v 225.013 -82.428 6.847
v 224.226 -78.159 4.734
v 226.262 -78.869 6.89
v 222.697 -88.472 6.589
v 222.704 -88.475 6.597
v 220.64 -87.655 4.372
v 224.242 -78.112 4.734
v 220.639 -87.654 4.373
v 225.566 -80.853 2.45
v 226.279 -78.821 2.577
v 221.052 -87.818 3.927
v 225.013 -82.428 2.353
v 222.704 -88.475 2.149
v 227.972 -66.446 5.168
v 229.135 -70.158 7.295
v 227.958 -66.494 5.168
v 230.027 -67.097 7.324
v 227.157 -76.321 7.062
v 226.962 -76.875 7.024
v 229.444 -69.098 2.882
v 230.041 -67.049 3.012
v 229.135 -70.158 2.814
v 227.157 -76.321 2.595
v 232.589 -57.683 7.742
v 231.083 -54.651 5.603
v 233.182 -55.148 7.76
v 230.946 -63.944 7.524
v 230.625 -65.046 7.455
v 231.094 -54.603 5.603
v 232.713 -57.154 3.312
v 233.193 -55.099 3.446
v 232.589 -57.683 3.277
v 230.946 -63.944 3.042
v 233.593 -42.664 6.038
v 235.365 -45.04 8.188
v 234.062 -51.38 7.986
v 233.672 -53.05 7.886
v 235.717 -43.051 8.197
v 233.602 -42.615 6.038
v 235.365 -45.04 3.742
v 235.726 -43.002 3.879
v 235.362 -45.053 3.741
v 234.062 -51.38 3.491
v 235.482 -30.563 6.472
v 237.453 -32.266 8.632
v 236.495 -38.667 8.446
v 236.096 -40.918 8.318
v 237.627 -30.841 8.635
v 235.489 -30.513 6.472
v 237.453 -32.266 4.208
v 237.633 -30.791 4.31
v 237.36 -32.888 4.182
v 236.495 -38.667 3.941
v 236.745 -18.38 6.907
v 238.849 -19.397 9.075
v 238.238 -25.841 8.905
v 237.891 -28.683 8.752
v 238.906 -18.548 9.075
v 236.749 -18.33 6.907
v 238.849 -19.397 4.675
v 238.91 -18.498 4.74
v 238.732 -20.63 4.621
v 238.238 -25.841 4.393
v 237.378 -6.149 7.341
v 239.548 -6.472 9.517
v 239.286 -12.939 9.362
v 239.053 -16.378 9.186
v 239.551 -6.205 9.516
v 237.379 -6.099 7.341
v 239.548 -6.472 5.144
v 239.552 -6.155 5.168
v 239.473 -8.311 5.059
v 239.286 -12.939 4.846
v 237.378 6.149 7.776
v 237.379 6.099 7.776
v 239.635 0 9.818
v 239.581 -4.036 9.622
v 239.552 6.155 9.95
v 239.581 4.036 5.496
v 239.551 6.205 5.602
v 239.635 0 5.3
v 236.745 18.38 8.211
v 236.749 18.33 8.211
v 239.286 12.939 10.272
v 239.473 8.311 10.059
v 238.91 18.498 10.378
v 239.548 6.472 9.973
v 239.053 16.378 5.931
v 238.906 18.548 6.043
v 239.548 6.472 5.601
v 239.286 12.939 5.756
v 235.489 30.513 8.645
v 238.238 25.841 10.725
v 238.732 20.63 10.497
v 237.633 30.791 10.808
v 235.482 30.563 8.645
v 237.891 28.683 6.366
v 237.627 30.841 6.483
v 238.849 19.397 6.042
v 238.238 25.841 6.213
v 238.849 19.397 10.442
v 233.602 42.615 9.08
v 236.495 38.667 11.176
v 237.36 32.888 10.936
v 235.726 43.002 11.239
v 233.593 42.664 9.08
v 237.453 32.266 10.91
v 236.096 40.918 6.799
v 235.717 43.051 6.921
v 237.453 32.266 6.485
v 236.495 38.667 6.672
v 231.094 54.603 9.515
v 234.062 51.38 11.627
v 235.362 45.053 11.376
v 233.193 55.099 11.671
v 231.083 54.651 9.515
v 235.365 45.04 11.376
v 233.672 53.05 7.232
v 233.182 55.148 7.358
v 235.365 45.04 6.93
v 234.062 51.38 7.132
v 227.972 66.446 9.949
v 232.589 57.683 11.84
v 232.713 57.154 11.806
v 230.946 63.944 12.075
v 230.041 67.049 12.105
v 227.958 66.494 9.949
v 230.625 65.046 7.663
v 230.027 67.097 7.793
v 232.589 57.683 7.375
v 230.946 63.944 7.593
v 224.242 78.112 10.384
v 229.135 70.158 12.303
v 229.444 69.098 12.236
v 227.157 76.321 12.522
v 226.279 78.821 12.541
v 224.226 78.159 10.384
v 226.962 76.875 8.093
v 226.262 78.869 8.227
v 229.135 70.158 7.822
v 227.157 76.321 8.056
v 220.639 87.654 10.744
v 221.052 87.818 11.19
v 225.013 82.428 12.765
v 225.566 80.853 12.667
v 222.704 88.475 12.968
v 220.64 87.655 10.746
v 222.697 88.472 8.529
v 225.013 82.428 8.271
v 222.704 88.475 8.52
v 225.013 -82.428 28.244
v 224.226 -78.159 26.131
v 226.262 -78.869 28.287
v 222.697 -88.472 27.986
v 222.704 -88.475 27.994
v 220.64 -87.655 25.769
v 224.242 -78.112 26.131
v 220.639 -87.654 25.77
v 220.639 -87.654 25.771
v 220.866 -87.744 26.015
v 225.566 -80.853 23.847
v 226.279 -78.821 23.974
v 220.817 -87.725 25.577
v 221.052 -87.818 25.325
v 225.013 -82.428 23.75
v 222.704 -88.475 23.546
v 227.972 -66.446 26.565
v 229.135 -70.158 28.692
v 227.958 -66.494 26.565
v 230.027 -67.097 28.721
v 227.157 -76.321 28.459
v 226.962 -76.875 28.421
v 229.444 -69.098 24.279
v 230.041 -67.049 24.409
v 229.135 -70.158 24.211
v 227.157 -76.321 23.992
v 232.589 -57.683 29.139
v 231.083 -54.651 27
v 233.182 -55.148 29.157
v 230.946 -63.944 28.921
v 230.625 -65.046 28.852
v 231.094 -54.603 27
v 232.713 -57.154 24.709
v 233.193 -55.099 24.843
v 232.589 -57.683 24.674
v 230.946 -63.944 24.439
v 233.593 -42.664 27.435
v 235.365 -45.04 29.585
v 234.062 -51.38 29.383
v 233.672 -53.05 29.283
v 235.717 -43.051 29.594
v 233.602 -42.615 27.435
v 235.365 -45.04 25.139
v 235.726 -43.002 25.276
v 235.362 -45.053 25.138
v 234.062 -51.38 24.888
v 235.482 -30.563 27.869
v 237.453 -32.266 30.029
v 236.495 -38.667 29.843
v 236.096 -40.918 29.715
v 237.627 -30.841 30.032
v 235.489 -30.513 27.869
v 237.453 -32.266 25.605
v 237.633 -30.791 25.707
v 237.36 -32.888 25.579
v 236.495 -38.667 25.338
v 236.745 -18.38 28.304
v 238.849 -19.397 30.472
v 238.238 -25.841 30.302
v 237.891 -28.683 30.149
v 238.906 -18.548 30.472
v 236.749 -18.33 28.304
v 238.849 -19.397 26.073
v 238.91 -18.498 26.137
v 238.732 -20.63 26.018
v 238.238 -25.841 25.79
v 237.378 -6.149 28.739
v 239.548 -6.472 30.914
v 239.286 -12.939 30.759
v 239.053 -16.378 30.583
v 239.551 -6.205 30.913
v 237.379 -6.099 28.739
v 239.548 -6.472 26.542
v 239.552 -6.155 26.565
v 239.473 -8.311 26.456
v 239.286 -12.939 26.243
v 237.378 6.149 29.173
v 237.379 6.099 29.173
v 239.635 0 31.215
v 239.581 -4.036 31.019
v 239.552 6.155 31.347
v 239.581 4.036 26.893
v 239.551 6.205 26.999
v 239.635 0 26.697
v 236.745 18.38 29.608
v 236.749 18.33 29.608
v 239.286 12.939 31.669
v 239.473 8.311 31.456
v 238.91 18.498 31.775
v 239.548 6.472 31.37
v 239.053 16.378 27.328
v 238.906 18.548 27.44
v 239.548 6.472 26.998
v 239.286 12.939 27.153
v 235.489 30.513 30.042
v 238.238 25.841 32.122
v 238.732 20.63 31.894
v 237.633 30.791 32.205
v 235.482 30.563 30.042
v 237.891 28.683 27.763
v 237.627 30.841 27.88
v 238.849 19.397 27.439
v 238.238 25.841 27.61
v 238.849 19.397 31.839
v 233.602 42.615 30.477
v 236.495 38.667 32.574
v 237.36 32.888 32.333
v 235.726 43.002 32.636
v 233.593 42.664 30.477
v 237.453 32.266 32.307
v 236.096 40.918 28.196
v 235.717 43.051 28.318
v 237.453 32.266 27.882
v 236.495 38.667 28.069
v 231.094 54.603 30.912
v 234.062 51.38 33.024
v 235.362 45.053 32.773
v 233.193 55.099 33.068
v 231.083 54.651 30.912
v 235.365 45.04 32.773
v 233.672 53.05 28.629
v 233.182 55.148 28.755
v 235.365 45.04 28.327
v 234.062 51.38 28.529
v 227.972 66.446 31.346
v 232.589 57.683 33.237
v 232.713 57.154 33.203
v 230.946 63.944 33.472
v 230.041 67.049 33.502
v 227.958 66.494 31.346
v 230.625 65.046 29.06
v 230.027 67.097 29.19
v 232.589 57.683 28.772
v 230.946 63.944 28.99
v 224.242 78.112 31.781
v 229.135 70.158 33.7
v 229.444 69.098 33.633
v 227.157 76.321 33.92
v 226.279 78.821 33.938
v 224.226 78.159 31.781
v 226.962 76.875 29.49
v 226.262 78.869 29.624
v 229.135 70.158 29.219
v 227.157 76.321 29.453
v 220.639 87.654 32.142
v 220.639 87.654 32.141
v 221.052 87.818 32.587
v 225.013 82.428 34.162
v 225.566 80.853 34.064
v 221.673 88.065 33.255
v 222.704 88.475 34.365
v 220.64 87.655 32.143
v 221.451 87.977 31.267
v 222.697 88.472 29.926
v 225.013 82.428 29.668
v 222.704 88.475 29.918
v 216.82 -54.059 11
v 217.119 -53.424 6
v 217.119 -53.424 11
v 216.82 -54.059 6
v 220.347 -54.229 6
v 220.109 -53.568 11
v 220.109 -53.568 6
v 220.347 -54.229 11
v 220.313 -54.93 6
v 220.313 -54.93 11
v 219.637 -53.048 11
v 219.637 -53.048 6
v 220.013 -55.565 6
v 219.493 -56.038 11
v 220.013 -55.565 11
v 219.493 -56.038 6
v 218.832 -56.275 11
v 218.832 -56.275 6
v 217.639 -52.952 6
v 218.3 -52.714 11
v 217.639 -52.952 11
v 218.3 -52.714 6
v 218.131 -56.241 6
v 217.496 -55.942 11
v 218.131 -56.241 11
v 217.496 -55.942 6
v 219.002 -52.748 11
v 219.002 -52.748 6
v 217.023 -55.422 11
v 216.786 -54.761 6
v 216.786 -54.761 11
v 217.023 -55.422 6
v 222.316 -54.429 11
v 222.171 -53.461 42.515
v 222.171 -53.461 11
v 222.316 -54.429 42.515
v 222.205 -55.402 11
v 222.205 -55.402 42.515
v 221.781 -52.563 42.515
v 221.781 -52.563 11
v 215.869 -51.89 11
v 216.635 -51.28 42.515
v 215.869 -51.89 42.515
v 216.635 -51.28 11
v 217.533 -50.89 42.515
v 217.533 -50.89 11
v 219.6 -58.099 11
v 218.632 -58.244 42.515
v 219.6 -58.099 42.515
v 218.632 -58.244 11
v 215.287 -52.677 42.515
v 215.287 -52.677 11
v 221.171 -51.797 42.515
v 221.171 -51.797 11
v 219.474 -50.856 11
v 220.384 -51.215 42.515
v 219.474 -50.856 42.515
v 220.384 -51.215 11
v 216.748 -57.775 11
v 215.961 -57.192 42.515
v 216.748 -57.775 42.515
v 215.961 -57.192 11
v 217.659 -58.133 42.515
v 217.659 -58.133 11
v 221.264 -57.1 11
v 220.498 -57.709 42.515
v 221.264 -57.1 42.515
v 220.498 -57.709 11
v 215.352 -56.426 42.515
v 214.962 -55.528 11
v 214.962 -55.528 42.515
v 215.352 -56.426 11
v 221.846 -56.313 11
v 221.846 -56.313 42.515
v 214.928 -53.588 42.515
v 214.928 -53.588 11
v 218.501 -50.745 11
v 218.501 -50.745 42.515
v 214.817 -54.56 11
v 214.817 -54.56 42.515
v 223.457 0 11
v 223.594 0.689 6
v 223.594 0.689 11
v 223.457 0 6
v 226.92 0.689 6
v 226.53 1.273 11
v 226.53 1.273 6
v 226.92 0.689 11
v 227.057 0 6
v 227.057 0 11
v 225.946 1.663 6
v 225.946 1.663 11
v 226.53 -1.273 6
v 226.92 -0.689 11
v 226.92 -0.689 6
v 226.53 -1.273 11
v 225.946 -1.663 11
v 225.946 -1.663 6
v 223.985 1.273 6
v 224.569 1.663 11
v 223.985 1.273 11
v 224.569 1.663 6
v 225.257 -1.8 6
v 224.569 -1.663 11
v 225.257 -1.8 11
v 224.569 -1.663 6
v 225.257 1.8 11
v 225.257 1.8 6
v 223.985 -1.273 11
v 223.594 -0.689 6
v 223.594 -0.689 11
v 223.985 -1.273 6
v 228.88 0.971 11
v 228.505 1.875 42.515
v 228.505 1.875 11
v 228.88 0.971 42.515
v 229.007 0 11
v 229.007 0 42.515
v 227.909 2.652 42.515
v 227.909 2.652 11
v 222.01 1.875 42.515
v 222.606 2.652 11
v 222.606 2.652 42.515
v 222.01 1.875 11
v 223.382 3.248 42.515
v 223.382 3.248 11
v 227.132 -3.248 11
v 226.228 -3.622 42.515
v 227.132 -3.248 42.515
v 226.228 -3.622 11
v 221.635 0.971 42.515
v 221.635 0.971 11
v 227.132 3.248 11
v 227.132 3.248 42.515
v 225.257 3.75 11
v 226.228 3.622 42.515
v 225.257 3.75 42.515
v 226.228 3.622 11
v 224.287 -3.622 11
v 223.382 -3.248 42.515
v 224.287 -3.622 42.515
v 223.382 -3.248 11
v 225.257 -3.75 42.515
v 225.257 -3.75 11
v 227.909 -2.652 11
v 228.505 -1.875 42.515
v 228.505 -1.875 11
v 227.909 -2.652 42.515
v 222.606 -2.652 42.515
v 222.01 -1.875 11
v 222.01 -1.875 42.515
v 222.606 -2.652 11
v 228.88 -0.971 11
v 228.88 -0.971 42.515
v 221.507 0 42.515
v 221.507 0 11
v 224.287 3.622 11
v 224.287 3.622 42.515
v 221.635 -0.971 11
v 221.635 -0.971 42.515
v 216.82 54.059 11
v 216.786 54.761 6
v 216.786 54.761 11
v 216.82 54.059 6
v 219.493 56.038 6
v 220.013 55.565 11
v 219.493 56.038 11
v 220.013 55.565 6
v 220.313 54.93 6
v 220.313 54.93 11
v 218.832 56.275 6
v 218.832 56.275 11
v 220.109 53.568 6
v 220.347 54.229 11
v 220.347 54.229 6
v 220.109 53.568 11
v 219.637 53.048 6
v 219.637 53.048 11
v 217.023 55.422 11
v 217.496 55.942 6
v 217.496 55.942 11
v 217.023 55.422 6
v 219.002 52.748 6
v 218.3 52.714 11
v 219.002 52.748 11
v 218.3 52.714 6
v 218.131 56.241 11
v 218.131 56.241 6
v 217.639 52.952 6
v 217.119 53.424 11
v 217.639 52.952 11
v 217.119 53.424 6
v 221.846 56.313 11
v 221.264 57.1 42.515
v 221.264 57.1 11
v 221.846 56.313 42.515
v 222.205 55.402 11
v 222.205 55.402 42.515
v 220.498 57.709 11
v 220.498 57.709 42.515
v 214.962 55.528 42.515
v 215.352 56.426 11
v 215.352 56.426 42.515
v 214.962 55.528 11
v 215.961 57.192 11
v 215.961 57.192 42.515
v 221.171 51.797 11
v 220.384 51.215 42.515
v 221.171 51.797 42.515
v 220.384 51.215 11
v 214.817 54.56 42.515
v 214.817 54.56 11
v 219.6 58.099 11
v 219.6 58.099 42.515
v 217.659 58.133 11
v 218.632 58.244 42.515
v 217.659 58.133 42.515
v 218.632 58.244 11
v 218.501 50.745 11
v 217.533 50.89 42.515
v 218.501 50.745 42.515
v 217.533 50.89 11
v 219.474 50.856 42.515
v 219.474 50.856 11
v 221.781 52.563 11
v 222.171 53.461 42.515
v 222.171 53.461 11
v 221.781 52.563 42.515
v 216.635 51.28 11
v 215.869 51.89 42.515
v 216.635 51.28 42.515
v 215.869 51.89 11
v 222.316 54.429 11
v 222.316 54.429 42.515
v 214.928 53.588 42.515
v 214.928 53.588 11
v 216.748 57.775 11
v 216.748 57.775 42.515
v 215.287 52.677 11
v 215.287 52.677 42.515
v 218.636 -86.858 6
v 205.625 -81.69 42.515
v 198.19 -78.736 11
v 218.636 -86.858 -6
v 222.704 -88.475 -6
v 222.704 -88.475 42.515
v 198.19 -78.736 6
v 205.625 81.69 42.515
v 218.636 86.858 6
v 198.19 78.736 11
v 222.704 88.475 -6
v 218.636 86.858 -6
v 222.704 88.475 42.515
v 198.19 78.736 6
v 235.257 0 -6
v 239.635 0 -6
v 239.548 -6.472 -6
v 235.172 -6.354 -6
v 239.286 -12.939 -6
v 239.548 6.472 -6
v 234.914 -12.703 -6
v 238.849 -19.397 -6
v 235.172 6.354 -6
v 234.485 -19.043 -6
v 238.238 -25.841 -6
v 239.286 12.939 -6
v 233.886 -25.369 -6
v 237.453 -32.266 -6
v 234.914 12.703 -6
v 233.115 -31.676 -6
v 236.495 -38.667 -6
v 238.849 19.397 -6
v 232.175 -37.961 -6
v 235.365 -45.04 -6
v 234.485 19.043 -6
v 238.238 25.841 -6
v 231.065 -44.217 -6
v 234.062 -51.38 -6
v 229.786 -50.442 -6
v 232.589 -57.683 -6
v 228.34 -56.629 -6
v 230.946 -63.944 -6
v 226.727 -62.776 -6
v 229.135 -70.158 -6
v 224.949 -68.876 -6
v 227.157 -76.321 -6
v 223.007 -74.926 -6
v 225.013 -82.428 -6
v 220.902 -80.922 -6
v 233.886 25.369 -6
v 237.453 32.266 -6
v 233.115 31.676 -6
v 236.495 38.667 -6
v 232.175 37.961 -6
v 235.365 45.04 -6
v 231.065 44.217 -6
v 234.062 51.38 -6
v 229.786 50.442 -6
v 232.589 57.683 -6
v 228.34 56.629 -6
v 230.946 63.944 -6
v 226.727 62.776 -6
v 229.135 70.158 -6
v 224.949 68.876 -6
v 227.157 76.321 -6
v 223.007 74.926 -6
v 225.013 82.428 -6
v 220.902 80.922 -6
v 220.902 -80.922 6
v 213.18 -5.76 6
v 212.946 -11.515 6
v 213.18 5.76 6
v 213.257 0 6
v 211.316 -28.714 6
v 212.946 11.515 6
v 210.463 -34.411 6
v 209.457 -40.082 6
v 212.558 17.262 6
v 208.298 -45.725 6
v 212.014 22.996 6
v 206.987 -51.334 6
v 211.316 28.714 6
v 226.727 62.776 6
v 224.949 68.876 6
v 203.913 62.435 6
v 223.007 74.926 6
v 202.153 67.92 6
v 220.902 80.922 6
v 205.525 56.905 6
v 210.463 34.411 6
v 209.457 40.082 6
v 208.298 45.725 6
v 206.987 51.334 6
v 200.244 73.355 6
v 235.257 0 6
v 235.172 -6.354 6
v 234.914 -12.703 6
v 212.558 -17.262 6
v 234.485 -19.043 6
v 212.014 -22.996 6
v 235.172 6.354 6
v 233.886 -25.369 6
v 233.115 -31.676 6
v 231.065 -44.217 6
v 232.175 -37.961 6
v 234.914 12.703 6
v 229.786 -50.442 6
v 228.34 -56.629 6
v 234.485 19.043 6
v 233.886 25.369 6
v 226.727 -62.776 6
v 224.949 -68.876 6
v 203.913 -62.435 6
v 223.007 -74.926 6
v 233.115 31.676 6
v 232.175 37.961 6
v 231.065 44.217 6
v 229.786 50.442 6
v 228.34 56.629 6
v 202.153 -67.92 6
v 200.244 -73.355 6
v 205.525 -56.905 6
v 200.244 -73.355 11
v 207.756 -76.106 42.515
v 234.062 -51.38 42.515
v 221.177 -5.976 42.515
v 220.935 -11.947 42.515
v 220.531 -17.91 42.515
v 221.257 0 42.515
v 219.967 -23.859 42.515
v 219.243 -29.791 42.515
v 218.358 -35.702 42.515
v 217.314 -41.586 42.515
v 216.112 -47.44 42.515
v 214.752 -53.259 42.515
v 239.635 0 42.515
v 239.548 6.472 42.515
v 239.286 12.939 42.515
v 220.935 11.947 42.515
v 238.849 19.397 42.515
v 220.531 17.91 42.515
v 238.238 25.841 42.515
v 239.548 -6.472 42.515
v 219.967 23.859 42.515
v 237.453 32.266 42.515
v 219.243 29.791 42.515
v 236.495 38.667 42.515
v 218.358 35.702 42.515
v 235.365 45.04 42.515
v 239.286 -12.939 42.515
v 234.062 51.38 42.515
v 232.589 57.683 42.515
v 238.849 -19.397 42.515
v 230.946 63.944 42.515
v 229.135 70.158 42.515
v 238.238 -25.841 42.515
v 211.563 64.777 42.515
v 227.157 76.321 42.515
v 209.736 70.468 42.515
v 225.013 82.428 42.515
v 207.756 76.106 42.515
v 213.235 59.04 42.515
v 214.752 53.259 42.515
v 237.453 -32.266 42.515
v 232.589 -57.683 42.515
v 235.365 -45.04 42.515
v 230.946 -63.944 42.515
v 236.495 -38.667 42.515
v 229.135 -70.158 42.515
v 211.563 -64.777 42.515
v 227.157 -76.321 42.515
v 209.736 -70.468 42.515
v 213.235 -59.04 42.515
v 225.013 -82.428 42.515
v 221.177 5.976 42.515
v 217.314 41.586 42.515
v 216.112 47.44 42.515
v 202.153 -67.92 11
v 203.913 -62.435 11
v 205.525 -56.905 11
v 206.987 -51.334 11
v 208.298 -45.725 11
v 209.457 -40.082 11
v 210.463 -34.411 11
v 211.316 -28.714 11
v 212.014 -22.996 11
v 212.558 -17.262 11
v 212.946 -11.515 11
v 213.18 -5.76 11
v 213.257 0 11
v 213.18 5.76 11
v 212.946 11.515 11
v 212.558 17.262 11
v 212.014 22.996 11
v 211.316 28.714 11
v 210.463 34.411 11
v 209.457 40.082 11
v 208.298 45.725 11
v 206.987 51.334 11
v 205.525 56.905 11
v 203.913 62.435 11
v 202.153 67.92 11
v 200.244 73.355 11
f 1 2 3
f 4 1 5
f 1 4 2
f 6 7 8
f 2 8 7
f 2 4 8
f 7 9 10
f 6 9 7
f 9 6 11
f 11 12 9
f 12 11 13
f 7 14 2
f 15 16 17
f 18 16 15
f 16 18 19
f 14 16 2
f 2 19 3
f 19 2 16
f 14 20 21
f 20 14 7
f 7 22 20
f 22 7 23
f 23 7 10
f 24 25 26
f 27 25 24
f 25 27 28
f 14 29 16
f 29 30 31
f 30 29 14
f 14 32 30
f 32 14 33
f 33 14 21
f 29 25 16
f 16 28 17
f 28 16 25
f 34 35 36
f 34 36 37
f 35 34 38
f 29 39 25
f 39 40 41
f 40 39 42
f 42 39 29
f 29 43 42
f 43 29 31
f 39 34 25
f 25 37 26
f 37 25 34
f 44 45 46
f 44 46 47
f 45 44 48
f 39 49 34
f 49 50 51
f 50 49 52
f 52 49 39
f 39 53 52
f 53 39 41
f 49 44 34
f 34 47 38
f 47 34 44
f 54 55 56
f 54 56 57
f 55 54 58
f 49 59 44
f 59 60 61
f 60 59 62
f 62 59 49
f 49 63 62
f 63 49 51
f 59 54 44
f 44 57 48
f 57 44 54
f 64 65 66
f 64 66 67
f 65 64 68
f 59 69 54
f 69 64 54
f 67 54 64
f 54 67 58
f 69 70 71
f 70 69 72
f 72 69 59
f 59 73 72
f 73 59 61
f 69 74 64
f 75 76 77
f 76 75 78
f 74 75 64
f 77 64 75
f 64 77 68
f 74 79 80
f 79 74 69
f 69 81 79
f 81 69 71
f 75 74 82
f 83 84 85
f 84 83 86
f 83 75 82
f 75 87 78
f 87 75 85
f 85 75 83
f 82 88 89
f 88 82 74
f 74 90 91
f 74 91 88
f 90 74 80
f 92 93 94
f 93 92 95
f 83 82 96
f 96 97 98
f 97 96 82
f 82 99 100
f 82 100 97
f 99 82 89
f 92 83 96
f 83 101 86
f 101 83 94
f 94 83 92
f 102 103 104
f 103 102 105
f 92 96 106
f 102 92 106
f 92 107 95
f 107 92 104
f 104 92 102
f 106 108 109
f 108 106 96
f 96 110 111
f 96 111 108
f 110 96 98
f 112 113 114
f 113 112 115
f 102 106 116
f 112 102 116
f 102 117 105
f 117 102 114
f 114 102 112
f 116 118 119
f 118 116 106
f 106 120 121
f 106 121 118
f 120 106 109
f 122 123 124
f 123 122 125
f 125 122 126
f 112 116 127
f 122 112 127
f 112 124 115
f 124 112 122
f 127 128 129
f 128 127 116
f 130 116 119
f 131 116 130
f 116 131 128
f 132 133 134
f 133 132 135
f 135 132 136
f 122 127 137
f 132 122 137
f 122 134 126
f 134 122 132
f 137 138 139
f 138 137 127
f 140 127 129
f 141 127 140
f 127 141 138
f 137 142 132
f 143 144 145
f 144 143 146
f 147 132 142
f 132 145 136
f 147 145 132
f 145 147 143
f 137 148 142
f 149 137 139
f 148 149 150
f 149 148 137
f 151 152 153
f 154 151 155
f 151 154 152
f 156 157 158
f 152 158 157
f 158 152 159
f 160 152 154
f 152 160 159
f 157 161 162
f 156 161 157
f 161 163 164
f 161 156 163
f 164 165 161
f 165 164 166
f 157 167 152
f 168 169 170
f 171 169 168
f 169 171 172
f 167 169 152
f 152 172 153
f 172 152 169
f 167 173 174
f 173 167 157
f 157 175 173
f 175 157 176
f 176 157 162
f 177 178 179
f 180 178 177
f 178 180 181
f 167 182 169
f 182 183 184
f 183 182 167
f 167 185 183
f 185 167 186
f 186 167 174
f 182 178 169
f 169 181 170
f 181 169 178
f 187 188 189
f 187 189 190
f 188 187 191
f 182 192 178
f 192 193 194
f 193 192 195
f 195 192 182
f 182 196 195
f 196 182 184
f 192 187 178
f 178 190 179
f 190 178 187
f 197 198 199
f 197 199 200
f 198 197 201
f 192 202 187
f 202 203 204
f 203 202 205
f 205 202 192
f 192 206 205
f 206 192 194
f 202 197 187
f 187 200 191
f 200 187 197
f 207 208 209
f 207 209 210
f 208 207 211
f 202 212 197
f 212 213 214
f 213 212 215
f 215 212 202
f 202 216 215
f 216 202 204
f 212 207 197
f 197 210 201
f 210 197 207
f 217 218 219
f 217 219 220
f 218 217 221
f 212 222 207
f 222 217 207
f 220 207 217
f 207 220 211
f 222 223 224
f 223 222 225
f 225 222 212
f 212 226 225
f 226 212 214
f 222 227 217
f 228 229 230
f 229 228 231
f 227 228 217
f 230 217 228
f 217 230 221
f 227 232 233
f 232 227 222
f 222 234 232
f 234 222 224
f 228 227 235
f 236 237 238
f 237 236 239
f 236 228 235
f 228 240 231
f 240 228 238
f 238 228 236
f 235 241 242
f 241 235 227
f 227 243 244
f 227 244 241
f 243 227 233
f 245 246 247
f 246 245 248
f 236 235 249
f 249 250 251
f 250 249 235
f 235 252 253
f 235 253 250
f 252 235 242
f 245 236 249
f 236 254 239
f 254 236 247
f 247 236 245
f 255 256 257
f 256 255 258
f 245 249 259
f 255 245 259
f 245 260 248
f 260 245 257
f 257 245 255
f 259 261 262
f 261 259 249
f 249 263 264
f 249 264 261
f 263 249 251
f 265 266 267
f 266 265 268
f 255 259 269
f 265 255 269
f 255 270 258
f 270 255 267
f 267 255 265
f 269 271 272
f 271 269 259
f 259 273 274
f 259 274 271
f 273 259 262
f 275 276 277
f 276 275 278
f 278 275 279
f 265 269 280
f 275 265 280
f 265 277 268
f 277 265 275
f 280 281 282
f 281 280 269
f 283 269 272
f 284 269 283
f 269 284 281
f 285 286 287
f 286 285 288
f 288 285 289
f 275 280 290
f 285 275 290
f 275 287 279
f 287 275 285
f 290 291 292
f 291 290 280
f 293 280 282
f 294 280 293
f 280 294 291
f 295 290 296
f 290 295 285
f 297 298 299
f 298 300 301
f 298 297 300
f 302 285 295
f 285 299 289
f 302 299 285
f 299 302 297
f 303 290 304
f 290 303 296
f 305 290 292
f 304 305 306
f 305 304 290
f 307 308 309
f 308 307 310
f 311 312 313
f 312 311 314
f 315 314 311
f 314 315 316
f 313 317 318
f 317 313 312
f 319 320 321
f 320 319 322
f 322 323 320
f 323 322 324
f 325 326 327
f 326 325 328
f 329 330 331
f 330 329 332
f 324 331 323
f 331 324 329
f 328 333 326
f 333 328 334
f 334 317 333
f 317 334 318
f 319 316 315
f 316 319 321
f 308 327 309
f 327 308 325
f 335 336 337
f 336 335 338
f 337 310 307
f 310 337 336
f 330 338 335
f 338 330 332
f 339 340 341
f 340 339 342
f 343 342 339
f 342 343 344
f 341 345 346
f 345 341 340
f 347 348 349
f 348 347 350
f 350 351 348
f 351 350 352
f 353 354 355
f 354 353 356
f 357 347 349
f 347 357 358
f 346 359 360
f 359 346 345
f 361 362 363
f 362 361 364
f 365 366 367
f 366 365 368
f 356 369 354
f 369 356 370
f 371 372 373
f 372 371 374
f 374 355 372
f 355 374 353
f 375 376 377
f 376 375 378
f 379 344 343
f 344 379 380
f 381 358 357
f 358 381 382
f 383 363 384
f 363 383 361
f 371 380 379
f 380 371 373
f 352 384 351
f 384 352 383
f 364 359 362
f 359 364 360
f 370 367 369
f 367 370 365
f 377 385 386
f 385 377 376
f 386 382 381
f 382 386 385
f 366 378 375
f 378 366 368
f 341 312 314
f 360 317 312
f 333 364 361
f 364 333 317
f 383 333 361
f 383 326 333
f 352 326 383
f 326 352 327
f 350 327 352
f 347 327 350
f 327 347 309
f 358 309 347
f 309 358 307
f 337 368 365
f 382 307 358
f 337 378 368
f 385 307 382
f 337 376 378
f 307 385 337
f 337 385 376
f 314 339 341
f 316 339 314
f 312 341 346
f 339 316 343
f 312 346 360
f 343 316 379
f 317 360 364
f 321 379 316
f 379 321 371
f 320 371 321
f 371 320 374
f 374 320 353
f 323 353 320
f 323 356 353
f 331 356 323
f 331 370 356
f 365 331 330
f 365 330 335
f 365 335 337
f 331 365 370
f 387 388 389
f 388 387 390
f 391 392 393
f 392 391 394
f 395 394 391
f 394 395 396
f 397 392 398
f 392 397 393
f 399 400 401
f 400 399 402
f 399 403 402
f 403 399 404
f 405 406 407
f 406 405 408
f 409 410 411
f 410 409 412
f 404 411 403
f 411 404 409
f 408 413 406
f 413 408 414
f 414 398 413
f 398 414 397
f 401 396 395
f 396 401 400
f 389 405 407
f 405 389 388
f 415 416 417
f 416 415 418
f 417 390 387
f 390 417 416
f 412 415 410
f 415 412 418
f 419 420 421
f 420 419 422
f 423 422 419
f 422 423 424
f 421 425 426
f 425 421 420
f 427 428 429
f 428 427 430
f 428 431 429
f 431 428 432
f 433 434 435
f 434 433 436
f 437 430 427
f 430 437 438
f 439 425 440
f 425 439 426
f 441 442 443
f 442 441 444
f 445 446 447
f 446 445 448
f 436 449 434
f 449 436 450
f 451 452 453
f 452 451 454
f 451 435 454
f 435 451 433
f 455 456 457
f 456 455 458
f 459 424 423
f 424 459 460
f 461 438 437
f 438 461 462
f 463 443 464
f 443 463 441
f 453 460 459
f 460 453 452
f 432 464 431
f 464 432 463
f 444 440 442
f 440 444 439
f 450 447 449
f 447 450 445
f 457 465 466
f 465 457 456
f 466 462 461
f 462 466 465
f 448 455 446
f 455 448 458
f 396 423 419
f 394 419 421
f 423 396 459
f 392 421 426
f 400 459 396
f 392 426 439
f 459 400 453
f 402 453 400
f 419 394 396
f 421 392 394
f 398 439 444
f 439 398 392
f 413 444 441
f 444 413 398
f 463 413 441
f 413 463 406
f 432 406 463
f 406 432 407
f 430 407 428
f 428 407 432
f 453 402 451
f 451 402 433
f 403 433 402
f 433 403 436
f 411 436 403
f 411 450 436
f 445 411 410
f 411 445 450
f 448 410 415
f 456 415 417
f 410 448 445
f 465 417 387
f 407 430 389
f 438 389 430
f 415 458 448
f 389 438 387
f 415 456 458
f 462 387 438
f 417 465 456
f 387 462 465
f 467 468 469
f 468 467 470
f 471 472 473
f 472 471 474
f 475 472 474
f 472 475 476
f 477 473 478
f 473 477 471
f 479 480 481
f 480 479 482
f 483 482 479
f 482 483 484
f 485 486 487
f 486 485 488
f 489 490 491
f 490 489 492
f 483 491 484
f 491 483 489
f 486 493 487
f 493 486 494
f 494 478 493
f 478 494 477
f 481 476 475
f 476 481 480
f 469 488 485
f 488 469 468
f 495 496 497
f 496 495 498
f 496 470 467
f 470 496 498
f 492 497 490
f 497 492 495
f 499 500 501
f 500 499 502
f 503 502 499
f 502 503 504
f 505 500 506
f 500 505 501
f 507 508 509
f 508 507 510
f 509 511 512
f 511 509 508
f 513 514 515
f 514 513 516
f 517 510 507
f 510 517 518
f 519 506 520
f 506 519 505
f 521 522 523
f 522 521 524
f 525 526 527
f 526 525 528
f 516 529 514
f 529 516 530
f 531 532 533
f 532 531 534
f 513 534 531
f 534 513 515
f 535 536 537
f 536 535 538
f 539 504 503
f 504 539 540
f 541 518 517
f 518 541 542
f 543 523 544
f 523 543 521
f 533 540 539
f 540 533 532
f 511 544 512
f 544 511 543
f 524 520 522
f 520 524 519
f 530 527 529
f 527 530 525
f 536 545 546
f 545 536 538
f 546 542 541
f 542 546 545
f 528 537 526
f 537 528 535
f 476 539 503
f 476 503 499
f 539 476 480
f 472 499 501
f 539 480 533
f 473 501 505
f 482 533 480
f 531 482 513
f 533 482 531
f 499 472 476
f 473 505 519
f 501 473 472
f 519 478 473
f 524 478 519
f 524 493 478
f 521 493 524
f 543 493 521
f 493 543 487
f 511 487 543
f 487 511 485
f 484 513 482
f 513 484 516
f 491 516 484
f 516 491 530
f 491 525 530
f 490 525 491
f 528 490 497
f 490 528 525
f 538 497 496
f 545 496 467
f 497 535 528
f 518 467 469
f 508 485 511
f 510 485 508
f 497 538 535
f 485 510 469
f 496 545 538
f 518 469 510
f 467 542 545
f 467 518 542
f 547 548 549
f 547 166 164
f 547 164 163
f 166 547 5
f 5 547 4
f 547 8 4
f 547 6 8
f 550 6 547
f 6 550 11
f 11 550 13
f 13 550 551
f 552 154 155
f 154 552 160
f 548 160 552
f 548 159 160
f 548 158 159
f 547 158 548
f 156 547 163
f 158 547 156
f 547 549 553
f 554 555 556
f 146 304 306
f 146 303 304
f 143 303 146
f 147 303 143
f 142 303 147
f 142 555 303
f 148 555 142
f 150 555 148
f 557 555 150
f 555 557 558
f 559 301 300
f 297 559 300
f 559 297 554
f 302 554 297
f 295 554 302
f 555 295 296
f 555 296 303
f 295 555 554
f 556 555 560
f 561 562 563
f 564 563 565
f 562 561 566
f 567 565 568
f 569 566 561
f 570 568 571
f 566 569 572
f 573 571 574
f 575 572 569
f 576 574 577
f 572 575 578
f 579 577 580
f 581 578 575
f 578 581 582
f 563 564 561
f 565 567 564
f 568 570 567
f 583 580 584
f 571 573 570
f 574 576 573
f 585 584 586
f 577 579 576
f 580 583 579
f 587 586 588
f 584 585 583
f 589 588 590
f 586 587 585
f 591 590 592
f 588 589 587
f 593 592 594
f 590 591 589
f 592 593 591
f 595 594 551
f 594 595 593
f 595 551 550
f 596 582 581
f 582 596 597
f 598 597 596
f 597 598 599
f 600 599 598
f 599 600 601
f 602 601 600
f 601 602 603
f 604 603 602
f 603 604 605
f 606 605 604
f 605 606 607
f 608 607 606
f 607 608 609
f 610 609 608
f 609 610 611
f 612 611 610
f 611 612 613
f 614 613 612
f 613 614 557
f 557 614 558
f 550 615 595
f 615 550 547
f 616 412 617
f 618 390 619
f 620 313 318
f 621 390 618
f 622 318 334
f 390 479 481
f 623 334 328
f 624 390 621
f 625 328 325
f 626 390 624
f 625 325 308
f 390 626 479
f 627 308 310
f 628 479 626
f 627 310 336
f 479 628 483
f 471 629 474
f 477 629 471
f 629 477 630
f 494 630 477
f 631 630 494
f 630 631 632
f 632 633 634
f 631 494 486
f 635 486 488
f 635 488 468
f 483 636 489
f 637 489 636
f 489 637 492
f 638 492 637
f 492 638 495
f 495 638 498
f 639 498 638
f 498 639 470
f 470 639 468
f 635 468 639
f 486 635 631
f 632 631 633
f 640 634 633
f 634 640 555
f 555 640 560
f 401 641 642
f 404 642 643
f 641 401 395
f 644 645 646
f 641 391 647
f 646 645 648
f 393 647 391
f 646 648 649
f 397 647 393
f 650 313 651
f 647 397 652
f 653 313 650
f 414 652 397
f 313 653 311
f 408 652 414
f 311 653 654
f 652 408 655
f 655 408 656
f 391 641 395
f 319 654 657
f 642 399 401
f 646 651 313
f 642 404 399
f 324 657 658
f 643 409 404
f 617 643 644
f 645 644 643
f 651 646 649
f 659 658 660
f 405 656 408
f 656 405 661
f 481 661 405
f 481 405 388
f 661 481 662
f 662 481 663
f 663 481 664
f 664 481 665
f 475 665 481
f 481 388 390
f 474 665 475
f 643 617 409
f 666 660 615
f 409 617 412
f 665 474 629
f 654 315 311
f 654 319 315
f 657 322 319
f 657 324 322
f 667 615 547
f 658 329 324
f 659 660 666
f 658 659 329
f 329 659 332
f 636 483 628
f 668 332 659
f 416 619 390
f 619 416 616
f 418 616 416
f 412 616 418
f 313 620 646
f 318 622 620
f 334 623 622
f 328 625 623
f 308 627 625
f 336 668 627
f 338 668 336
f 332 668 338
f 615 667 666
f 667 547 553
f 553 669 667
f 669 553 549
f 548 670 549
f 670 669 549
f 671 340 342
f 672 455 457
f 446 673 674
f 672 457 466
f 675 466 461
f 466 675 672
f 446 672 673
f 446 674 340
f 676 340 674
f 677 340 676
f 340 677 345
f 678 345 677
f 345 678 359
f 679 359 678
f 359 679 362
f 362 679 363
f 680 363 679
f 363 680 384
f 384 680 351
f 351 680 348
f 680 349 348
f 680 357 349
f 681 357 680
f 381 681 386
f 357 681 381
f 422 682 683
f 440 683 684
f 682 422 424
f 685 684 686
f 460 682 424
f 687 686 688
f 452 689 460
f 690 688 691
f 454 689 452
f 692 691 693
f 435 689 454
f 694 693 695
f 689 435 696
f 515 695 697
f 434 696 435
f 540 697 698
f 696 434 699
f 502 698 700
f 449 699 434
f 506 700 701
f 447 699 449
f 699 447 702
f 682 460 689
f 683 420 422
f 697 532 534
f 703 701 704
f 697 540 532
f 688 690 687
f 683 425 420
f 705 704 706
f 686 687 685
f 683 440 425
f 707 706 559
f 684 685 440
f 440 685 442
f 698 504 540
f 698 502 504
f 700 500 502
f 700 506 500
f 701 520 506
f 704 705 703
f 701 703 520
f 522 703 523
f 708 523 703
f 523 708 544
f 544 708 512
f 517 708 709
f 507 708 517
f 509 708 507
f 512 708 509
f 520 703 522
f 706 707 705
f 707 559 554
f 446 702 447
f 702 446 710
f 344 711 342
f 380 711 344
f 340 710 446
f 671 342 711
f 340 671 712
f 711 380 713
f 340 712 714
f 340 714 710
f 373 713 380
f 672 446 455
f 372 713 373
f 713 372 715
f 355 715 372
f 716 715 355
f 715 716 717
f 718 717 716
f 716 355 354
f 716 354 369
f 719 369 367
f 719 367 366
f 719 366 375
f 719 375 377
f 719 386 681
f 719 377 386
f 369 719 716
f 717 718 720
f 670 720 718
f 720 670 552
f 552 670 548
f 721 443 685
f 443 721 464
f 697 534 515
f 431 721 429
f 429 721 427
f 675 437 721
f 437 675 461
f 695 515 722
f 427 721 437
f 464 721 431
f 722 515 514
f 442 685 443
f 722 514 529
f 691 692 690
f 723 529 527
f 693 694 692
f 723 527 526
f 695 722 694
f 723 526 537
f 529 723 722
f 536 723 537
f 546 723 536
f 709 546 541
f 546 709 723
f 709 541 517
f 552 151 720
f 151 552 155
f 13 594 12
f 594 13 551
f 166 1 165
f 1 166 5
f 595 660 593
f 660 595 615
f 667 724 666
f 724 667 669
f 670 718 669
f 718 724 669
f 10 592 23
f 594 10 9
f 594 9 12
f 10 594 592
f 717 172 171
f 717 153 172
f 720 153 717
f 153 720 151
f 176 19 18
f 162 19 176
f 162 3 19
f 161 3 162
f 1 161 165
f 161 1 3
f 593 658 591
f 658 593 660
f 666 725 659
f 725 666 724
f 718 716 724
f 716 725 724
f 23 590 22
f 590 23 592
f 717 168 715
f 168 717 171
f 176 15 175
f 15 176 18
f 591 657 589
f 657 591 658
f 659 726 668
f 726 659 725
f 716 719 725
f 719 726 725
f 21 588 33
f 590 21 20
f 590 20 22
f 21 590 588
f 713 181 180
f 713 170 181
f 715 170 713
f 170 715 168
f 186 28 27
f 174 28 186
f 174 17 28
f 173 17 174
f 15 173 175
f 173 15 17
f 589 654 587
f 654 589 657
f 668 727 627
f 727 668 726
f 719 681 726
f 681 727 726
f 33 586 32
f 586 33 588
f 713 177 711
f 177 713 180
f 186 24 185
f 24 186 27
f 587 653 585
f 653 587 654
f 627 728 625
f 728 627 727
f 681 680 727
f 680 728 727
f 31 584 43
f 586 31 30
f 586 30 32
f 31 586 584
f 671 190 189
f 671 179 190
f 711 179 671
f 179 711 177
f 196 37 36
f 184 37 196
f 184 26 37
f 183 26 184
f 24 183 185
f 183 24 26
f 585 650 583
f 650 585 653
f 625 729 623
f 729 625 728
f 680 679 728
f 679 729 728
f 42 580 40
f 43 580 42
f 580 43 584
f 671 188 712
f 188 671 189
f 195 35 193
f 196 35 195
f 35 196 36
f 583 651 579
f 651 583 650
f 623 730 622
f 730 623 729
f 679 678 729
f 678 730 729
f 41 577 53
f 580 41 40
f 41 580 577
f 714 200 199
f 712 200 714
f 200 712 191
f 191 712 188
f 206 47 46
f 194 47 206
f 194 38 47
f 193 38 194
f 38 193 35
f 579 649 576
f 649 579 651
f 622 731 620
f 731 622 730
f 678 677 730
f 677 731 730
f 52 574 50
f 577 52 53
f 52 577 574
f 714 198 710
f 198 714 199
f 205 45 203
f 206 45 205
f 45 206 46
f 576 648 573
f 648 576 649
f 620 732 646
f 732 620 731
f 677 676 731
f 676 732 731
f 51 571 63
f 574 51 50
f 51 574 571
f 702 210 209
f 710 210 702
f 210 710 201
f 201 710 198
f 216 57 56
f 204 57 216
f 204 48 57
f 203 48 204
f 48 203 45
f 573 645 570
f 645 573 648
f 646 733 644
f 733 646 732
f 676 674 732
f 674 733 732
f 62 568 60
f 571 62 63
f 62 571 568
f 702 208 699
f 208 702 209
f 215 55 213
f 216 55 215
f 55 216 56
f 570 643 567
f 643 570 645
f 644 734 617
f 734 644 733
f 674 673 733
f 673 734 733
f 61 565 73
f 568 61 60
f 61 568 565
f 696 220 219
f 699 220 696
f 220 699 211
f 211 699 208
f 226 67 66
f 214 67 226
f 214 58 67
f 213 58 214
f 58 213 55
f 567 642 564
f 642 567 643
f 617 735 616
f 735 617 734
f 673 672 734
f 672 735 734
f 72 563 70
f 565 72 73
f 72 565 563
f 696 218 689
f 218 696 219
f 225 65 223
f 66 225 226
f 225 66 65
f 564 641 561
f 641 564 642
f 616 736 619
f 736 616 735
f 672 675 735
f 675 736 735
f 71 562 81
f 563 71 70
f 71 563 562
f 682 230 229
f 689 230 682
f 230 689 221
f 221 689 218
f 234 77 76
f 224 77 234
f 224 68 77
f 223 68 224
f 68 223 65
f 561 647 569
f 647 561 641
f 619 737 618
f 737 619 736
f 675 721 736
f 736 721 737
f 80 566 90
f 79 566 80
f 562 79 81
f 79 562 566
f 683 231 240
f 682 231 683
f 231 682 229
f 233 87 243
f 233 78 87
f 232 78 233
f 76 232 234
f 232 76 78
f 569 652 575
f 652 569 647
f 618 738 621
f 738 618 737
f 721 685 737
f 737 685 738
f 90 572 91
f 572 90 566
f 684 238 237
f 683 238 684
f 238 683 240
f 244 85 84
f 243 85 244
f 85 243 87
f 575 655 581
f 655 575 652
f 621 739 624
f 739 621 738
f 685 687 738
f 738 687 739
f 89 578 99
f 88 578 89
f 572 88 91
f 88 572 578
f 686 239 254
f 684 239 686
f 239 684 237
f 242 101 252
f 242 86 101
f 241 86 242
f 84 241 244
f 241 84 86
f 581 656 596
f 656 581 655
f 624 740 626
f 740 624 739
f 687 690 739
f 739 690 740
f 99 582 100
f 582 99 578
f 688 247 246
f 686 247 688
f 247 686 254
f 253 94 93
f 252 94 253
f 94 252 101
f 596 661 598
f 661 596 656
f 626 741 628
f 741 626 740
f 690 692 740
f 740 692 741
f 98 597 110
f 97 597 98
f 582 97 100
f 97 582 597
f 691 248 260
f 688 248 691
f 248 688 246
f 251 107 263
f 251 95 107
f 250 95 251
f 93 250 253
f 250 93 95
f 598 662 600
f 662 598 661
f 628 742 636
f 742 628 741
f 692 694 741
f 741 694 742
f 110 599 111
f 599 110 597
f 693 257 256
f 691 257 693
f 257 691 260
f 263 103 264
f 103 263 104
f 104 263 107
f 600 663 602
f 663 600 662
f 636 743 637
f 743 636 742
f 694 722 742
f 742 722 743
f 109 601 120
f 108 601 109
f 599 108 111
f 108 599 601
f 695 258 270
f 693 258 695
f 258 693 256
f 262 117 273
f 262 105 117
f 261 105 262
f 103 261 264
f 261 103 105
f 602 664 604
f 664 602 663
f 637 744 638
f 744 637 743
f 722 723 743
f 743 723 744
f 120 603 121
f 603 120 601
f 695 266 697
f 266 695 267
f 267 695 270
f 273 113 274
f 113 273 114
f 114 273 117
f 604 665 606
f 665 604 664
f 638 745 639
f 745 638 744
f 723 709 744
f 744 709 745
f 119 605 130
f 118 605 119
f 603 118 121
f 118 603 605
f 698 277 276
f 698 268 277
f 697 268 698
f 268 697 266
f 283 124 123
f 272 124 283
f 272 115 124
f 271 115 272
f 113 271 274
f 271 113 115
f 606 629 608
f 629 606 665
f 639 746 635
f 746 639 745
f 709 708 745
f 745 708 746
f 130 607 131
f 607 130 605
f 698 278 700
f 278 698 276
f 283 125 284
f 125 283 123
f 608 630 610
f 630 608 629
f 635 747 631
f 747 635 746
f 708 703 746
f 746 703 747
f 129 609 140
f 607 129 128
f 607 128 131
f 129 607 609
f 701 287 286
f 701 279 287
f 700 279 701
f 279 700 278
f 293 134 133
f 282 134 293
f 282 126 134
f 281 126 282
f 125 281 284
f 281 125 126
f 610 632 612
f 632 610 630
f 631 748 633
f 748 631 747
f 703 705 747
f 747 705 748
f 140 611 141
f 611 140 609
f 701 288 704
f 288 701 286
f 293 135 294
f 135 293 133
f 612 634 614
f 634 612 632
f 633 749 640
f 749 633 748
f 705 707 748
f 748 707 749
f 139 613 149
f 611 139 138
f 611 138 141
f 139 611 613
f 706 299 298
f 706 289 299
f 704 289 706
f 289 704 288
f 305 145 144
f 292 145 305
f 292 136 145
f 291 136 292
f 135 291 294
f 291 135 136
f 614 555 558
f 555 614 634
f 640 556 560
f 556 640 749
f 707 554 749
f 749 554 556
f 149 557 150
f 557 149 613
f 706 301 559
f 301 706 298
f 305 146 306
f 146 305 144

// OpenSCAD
// file: ../lib/helpers.scad
// Personal helper routines (house style for all OpenSCAD in this repo).
// Conventions:
//   tx/ty/tz(q)  translate along one axis; q may be a list -> replicate
//   txy/tyz/txz  translate in a plane by [a,b] or list of pairs -> replicate
//   rx/ry/rz(q)  rotate about one axis; list -> replicate
//   mx/my/mz(q)  mirror about one axis; list like [0,1] -> original + mirrored
//   cub(d, c)    cube with per-axis centering: 0 from origin, 1 centered,
//                -1 extending negative
//   sq(d, c, r)  2D analog of cub, optional corner radius r
//   hull_seq()   hull each adjacent pair of children (chained hulls)
// Prefer these over raw translate/rotate/mirror throughout.

module hull_seq()
  for (i=[0:$children-2]) hull() { children(i); children(i+1); }

module cub(d, c=[0, 0, 0])
  tx(c[0] == -1 ? -d[0] : c[0] ? -d[0]/2 : 0)
  ty(c[1] == -1 ? -d[1] : c[1] ? -d[1]/2 : 0)
  tz(c[2] == -1 ? -d[2] : c[2] ? -d[2]/2 : 0)
  cube(d);

module sq(d, c=[0, 0], r=0)
  tx(c[0] == -1 ? -d[0] : c[0] ? -d[0]/2 : 0)
  ty(c[1] == -1 ? -d[1] : c[1] ? -d[1]/2 : 0)
  if (r <= 0) { square(d); }
  else { hull() ty([r, d[1]-r]) tx([r, d[0]-r]) circle(r=r); }

module txy(q)
  if (is_list(q) && is_list(q[0])) for (qq=q) txy(qq) children();
  else translate([q[0], q[1], 0]) children();

module tyz(q)
  if (is_list(q) && is_list(q[0])) for (qq=q) tyz(qq) children();
  else translate([0, q[0], q[1]]) children();

module txz(q)
  if (is_list(q) && is_list(q[0])) for (qq=q) txz(qq) children();
  else translate([q[0], 0, q[1]]) children();

module tq(q, v)
  if (is_list(q)) for (qq=q) tq(qq, v) children();
  else translate(q*v) children();

module tx(q) tq(q, [1, 0, 0]) children();
module ty(q) tq(q, [0, 1, 0]) children();
module tz(q) tq(q, [0, 0, 1]) children();

module mq(q, v)
  if (is_list(q)) for (qq=q) mq(qq, v) children();
  else mirror(q*v) children();

module mx(q=1) mq(q, [1, 0, 0]) children();
module my(q=1) mq(q, [0, 1, 0]) children();
module mz(q=1) mq(q, [0, 0, 1]) children();

// generic rotation recursively expands q and rotates about v
module rq(q, v)
  if (is_list(q)) for (qq=q) rq(qq, v) children();
  else rotate(q*v) children();

// specific rotation about x, y, z for everyday convenience
module rx(q) rq(q, [1, 0, 0]) children();
module ry(q) rq(q, [0, 1, 0]) children();
module rz(q) rq(q, [0, 0, 1]) children();
// main file
// Printed capstan channel segment for a plain CIRCULAR ply rim (in
// the arm: the left base board's sector web), WEDGE-BACKED: the
// TWO-TRACK band seats flush ON the rim, so cable tension presses
// printed part onto wood; outboard of the board face the section
// fills solid from the band down past the rim to the leg — radial
// backing for the track loads — and the leg lands on the OUTBOARD
// ply face with three wood screws, each at the bottom of a deep
// counterbore reaching in from the outboard end face. The band is
// ONE-SIDED: flush with the arm-side face (band_z0), growing
// outboard, per the flush stack-up (params).
//
// The two track slots are 45-deg V's that climb across the arc at the
// shared ~1.9 deg lead (track_z in params.scad): the sector-side lay
// is positively located, the free spans leave square (zero fleet),
// and the V self-centers the cord. The ramp direction must match the
// drum groove's hand (params wrap-math note).
//
// Three ~180 mm prints: -D idx=<0..seg_n-1>. On the end prints the
// anchored run's slot STOPS 2 deg short of the arc end — the
// remaining band IS the anchor abutment: the cord continues through a
// 2.2 hole in line with its track and knots in a shallow recess on
// the segment END face, load path straight along the cord, no bend.
// Run A anchors at the idx-0 end, run B at the far end, the tracks'
// diagonal extremes; the other track runs wall-to-wall (its cable
// never reaches that end anyway).
//
// Print INVERTED, on the wide outboard end face: the arc lies in the
// bed plane, the V walls and the wedge diagonal print at >= 45 deg,
// the leg's board-side land faces UP, and the counterbores rise
// straight off the bed — no support anywhere.
//
// Local frame: arc bisector on +X, joint axis = Z.

include <params.scad>
use <../lib/helpers.scad>

idx = 1;                      // which segment (0..seg_n-1); -D override

half = seg_ang / 2;

// this segment's bisector on the sector arc (deg from the arc bisector)
function seg_bis(i) = -sector_angle / 2 + (i + 0.5) * seg_ang;

// r-z cross-section: track band over the rim; outboard of the board
// face the section fills SOLID down to the leg, closed by the print
// diagonal from the leg's reach up to the wide outboard end face
module seg_profile() polygon([
  [rim_r, band_z0], [crest_r, band_z0],
  [crest_r, band_z0 + band_wt],
  [rim_r - seg_back, band_z0 + band_wt],       // wide outboard face
  [rim_r - leg_d, sector_core_t / 2 + leg_t],  // print diagonal
  [rim_r - leg_d, sector_core_t / 2], [rim_r, sector_core_t / 2]]);

// one track slot: pairwise hulls of thin V slabs step the ramp —
// exact, since the ramp is linear in arc angle
module track_slot(i, run, a0, a1) {
  n = max(2, ceil((a1 - a0) / 3));
  for (k = [0 : n - 1]) hull() {
    slot_slab(i, run, a0 + k * (a1 - a0) / n);
    slot_slab(i, run, a0 + (k + 1) * (a1 - a0) / n);
  }
}
// the V cross-section (apex inward), stood tangentially thin at
// local angle a
module slot_slab(i, run, a) rz(a) rx(90)
  linear_extrude(0.05, center = true)
    polygon(let (zt = track_z(a + seg_bis(i), run),
                 o = (crest_r + 0.5 - apex_r) * tan(v_half))
      [[apex_r, zt], [crest_r + 0.5, zt + o], [crest_r + 0.5, zt - o]]);

module sector_segment(i = idx, end = 0) {
  za = track_z(end * half + seg_bis(i), end);  // anchored track's
                                               // station at the end face
  difference() {
    // the wedge section, swept over this segment's arc
    rz(-half) rotate_extrude(angle = seg_ang, $fn = 240) seg_profile();
    // track slots: the ANCHORED one stops 2 deg short of its arc end,
    // leaving the band itself as the anchor abutment
    track_slot(i, -1, end == -1 ? -half + 2 : -half - 0.5, half + 0.5);
    track_slot(i,  1, -half - 0.5, end == 1 ? half - 2 : half + 0.5);
    // leg screws into the ply face: shaft hole through the leg, head
    // at the bottom of a deep counterbore reaching in from the
    // outboard end face
    rz([-14, 0, 14]) tx(leg_screw_r) {
      tz(sector_core_t / 2 - 0.5)
        cylinder(d = leg_screw_d, h = leg_t + 1, $fn = 16);
      tz(sector_core_t / 2 + leg_t)
        cylinder(d = cb_d, h = band_z0 + band_wt + 1
                 - sector_core_t / 2 - leg_t, $fn = 24);
    }
    // anchor: the cord continues from the slot end through a 2.2 hole
    // in line with its track and knots in a shallow recess on the
    // segment END face — pull is straight along the cord, the knot is
    // tied in the open and seats as it tensions. (In the arm, the
    // lower end's knot sits in the board plane: nick the left board's
    // gusset corner to clear it.)
    if (end != 0) rz(end * half) tx(sector_eff_r) tz(za) {
      ty(-10) rx(-90) cylinder(d = 2.2, h = 16, $fn = 16);
      ty(-3) rx(-90) cylinder(d = 7, h = 6, $fn = 24);
    }
    // ALTERNATIVE anchor, outboard end only: a RADIAL hole just
    // forward of the slot stop — the cord dives from the track floor
    // through the wedge and knots against the inner (diagonal) face,
    // which is open air at run B's station. Either anchor can be
    // used. Run A's end gets no radial hole: its track rides the
    // board plane, so the hole would exit into the ply seat.
    if (end == 1) rz(half - 3) tz(track_z(half - 3 + seg_bis(i), 1))
      tx(218) ry(90) cylinder(d = 2.2, h = 22, $fn = 16);
  }
}

sector_segment(idx, idx == 0 ? -1 : idx == seg_n - 1 ? 1 : 0);
